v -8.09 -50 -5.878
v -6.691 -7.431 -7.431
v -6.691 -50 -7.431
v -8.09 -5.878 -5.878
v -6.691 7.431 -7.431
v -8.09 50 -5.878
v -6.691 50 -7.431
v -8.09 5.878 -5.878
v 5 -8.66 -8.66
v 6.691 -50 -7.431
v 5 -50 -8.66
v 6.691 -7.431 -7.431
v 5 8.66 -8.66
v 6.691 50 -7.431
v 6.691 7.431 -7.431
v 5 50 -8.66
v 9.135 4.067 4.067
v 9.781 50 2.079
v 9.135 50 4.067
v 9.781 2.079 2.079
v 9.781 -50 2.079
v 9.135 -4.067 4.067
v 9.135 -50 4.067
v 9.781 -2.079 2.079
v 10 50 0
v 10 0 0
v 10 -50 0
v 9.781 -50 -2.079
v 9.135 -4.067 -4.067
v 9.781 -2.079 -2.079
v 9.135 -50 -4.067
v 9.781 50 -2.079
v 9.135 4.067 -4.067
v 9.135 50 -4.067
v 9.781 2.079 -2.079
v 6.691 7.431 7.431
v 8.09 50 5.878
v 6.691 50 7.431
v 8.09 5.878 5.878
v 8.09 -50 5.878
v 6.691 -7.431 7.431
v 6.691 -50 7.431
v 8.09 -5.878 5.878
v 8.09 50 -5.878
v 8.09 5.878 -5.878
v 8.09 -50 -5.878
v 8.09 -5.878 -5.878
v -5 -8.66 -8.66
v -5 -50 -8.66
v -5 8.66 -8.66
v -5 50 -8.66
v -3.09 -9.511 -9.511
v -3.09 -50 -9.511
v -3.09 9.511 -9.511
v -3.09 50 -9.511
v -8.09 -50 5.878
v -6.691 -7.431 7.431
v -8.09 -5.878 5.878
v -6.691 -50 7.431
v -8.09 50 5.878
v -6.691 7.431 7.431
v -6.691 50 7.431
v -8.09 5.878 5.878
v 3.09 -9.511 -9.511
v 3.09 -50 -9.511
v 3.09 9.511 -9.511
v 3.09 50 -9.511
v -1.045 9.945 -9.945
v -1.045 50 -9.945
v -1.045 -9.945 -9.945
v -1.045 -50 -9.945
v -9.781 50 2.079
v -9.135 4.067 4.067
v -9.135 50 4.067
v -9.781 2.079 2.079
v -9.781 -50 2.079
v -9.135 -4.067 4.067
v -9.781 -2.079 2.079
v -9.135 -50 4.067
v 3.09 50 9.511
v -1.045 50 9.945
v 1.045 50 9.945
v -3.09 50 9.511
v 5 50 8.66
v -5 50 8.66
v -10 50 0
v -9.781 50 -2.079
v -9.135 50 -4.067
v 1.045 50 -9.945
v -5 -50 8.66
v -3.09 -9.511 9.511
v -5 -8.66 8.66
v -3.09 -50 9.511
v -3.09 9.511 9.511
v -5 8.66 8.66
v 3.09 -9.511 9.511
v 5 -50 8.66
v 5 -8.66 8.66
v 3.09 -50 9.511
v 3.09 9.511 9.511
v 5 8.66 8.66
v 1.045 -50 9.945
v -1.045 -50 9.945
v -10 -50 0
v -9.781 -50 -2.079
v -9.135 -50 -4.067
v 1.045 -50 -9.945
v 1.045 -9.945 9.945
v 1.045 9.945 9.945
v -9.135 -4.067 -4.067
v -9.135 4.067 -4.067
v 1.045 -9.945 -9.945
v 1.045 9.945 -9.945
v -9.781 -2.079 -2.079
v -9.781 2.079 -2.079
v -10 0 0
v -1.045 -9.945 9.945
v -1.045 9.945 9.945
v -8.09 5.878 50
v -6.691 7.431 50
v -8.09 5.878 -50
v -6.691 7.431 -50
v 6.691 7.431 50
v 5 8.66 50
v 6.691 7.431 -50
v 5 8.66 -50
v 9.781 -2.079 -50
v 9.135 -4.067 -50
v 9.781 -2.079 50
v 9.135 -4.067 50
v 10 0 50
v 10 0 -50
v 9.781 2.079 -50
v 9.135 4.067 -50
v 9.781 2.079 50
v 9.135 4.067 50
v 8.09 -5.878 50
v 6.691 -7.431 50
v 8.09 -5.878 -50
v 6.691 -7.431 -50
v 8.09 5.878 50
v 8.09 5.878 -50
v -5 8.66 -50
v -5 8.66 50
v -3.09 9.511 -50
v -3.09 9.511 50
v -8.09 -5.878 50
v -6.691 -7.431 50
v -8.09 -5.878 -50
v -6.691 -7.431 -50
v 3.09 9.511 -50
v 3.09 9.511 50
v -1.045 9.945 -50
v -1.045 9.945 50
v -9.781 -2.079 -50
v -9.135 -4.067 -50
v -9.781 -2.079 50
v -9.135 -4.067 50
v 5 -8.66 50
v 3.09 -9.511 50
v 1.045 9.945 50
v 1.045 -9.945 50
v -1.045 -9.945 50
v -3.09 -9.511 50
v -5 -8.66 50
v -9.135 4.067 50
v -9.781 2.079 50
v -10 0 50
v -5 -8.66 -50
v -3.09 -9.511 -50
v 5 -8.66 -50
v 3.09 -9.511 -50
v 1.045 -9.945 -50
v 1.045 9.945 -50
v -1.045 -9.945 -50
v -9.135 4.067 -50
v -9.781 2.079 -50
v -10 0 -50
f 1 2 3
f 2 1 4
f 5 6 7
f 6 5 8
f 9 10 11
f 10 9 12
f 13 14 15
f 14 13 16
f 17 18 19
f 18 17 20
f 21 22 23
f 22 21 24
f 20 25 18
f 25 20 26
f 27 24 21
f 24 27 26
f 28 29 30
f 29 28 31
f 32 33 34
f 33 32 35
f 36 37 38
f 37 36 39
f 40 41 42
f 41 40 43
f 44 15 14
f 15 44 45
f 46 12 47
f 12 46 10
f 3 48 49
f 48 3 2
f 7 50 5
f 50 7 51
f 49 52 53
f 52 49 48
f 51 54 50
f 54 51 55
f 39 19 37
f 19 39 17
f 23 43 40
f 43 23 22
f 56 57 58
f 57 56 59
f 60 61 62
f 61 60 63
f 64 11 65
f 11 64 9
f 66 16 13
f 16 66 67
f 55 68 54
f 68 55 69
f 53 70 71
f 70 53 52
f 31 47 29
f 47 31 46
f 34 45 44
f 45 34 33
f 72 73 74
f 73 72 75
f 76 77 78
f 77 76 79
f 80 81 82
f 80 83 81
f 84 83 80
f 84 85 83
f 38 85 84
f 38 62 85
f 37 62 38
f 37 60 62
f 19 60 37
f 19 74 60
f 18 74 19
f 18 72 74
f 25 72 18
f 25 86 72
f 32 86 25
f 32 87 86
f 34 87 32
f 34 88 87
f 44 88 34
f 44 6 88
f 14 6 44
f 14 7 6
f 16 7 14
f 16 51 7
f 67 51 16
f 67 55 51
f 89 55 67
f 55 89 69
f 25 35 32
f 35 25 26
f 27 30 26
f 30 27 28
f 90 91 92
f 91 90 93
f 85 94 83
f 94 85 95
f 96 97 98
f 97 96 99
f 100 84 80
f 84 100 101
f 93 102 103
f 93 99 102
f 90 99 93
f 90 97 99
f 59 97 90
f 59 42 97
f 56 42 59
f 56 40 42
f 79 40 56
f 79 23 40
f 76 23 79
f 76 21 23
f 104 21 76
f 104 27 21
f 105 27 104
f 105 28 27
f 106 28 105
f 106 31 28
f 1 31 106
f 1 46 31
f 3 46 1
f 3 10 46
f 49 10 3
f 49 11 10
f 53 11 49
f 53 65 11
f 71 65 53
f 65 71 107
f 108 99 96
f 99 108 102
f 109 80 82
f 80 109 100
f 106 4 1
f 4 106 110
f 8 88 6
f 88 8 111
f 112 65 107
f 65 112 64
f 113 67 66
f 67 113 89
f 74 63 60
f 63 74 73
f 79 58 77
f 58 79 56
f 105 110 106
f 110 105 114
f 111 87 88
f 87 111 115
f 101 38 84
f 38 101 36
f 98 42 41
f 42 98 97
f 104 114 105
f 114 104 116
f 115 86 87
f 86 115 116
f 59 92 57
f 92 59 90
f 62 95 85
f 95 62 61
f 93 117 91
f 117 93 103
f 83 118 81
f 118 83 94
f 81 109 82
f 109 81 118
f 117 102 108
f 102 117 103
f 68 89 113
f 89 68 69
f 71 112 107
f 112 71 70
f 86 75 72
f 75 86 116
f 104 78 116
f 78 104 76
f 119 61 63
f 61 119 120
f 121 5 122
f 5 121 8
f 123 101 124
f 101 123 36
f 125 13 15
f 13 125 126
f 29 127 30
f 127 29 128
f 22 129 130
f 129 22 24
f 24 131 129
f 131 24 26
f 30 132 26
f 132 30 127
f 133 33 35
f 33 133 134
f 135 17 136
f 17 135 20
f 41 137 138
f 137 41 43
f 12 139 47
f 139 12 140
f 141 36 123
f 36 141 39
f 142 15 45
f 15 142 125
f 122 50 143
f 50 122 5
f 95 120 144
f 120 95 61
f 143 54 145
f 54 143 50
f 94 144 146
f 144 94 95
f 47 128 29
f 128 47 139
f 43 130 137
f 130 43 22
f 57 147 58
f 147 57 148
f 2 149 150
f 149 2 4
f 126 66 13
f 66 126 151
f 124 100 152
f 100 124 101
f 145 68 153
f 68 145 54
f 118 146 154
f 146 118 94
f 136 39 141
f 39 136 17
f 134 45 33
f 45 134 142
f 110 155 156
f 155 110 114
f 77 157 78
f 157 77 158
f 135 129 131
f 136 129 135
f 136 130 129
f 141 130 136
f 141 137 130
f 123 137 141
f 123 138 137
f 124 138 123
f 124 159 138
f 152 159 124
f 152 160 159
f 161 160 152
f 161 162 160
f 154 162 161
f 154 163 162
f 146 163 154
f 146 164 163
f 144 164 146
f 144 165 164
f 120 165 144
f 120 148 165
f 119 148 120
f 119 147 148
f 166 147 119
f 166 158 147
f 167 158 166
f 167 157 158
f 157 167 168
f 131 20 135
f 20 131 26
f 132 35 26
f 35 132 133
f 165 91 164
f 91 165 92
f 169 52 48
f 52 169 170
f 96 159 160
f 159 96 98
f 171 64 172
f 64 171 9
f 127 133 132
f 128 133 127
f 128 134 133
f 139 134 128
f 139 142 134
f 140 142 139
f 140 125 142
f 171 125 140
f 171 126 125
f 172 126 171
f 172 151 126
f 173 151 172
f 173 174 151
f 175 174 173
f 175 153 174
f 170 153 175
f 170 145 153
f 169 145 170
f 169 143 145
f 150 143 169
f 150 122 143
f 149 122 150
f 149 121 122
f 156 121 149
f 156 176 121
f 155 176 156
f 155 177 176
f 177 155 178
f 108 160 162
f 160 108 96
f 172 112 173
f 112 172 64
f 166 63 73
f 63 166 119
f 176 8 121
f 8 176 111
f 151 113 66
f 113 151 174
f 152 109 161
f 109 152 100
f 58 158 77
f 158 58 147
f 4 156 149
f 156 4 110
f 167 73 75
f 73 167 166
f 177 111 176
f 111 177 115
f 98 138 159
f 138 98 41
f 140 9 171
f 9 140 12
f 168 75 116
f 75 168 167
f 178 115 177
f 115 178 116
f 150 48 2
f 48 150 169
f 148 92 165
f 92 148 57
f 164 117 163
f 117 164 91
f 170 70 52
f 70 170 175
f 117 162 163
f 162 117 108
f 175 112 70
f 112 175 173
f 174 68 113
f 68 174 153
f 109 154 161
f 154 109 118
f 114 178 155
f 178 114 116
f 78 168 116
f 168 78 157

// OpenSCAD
// See http://en.wikibooks.org/wiki/OpenSCAD_User_Manual/The_OpenSCAD_Language#Modules

module hole(distance, rot, size) {
     rotate(a = rot, v = [1, 0, 0]) {
         translate([0, distance, 0]) {
             cylinder(r = size, h = 100, center = true);
         }
     }
}

hole(0, 90, 10);
hole(0, 180, 10);
